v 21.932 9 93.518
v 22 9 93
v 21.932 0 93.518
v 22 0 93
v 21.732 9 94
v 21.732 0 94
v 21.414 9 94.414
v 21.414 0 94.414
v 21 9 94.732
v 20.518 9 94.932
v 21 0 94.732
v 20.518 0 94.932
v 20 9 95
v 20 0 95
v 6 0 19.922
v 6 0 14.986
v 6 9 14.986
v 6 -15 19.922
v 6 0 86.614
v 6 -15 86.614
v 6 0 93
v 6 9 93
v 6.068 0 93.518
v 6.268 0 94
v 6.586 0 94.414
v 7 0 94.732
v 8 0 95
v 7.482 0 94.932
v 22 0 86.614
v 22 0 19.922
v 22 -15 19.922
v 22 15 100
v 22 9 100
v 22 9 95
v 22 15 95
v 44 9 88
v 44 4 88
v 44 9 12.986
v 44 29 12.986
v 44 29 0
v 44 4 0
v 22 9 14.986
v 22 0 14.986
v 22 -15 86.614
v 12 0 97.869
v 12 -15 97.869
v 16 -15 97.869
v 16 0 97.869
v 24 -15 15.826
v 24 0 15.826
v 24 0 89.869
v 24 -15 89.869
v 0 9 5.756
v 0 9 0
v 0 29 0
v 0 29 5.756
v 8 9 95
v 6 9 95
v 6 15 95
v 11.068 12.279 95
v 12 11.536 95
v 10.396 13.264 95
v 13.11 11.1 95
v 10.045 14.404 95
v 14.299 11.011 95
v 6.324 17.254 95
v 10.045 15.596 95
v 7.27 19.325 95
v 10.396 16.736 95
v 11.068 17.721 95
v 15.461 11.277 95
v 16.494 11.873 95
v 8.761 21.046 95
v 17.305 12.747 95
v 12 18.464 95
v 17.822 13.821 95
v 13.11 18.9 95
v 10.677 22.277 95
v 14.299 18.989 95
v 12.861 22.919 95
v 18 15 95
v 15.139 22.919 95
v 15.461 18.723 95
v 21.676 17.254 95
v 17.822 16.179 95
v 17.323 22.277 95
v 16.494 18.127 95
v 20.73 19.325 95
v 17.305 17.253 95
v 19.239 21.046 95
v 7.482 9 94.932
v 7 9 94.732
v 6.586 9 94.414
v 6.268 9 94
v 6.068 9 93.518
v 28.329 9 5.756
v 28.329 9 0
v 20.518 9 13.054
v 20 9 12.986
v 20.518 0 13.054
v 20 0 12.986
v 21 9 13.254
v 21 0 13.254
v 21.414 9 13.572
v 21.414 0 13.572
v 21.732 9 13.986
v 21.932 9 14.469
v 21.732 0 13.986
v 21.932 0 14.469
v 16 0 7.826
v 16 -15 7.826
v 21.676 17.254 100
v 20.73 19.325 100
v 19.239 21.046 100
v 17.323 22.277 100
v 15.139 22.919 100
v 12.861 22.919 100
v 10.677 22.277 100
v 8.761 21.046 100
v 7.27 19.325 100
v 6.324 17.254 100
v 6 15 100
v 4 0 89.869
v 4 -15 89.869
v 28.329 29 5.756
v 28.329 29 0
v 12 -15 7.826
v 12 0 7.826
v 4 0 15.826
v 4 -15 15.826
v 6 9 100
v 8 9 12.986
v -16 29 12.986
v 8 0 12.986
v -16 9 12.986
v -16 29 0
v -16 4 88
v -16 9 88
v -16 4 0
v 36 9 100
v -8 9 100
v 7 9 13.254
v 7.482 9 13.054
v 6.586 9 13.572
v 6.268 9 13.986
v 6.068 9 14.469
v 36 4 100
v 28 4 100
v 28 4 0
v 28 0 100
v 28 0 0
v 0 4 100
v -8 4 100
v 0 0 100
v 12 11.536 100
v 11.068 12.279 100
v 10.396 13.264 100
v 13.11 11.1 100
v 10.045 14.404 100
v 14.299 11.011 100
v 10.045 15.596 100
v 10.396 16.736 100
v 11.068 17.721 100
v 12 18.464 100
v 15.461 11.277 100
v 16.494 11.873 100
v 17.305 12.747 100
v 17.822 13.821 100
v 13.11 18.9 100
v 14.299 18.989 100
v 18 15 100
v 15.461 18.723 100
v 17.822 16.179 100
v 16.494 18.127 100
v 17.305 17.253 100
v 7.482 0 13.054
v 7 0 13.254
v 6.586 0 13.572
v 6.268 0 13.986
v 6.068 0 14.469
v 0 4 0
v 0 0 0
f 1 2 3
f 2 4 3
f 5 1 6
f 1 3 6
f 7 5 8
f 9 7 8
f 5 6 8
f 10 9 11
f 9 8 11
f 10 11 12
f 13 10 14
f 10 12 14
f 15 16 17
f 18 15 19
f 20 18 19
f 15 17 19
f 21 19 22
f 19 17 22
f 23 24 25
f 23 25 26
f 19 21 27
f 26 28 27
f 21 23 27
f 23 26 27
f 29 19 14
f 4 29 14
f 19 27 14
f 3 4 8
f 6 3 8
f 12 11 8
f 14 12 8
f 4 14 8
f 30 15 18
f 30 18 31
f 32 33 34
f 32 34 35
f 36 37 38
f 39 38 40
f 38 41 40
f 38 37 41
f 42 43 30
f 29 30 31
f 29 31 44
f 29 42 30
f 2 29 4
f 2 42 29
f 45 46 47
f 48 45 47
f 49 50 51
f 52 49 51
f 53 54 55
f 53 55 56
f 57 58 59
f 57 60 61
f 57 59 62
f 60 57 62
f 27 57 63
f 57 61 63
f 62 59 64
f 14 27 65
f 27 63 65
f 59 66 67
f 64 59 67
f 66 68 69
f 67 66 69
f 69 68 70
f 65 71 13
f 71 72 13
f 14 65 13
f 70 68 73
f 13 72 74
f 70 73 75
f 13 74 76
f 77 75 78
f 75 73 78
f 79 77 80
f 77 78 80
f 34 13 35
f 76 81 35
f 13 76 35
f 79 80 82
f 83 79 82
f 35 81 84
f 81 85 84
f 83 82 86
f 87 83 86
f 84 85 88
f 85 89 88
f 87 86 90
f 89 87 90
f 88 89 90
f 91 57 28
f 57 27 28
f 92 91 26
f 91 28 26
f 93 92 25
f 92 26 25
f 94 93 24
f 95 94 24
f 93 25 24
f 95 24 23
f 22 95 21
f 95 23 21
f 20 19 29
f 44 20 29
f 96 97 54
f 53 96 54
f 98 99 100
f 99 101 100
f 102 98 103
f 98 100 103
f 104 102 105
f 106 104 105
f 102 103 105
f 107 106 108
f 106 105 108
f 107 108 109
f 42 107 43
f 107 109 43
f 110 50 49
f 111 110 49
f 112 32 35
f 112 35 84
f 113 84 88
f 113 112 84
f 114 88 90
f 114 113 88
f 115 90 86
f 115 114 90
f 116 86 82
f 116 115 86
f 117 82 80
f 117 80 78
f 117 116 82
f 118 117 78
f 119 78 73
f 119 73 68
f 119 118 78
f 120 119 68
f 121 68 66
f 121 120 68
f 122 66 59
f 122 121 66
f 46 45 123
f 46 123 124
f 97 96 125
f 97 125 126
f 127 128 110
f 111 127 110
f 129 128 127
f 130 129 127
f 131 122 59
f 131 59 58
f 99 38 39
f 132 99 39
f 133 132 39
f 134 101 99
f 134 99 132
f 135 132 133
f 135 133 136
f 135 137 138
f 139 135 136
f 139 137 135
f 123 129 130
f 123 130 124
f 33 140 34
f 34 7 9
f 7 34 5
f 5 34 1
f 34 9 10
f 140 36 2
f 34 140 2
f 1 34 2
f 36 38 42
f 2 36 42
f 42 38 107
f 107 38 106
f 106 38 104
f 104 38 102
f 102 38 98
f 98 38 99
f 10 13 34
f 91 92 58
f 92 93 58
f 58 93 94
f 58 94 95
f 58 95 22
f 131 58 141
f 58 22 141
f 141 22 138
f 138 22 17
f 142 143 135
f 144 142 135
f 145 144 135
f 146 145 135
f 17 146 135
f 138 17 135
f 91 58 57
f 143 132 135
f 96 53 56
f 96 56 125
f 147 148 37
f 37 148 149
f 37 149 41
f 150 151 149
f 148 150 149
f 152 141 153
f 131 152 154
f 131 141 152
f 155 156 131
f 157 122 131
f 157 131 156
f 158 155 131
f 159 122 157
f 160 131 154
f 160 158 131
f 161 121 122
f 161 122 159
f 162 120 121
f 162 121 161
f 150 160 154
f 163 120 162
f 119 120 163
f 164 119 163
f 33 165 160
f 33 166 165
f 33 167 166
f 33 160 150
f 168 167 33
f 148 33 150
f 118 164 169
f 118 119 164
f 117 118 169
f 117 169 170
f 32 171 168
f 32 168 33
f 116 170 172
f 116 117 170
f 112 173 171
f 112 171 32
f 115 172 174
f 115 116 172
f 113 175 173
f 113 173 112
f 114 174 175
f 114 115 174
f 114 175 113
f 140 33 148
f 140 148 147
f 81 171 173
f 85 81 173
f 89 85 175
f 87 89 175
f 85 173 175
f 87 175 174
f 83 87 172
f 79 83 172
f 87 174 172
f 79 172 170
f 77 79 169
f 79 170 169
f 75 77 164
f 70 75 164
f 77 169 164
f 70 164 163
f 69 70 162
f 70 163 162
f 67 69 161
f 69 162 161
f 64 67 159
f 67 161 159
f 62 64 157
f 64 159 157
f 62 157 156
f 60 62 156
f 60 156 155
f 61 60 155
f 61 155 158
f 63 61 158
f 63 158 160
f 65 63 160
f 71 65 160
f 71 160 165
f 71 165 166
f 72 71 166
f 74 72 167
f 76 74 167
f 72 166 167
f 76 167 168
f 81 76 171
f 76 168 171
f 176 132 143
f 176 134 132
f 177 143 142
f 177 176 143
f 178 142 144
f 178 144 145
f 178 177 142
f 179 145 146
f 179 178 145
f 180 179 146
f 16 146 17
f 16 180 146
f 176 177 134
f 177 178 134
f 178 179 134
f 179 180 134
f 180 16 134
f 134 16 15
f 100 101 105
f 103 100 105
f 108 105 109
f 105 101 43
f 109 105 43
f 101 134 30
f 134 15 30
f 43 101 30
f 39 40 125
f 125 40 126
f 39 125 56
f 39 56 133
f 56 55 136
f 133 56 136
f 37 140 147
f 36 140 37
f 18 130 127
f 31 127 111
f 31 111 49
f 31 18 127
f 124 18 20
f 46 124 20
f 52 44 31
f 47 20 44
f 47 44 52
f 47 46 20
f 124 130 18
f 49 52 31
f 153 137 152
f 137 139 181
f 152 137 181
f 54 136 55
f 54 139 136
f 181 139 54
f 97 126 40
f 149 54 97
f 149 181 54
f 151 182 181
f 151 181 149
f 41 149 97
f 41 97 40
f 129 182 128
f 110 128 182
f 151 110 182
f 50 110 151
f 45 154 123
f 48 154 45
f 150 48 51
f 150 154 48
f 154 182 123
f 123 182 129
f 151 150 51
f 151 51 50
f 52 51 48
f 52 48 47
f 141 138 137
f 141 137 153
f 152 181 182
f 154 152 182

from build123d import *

# Parameters (mm, degrees)
BOSS_EXTRUDE1_DEPTH = 100
SKETCH2_R           = 4
BOSS_EXTRUDE2_DEPTH = 5
CUT_EXTRUDE1_DEPTH  = 111.145358504
BOSS_EXTRUDE3_DEPTH = 20
SKETCH6_W           = 16
SKETCH6_H           = 82.013760225
CUT_EXTRUDE2_DEPTH  = 20
FILLET1_R           = 2
SKETCH7_W           = 20
SKETCH7_H           = 90.042878707
SKETCH7_W_2         = 16
SKETCH7_H_2         = 66.692206804
BOSS_EXTRUDE4_DEPTH = 15
CHAMFER1_SIZE       = 8


with BuildPart() as part:
    # Sketch1 → Boss-Extrude1 (new body)
    with BuildSketch(Plane.XY):
        Polygon((28, 4), (44, 4), (44, 9), (-16, 9), (-16, 4), (0, 4), (0, 0), (28, 0), align=None)
    extrude(amount=BOSS_EXTRUDE1_DEPTH)

    # Sketch2 → Boss-Extrude2 (add)
    with BuildSketch(Plane.XY.offset(100)):
        with BuildLine():
            Line((6, 15), (6, 0))
            Line((6, 0), (22, 0))
            Line((22, 0), (22, 15))
            ThreePointArc((22, 15), (14, 23), (6, 15))
        make_face()
        with Locations((14, 15)):
            Circle(SKETCH2_R, mode=Mode.SUBTRACT)
    extrude(amount=-BOSS_EXTRUDE2_DEPTH)

    # Sketch3 → Cut-Extrude1 (cut, through all)
    with BuildSketch(Plane(origin=(0, 9, 0), x_dir=(1, 0, 0), z_dir=(0, 1, 0))):
        Polygon((36, -100), (44, -88), (44, -100), align=None)
        Polygon((-8, -100), (-16, -100), (-16, -88), align=None)
    extrude(amount=-CUT_EXTRUDE1_DEPTH, mode=Mode.SUBTRACT)

    # Sketch5 → Boss-Extrude3 (add)
    with BuildSketch(Plane(origin=(0, 9, 0), x_dir=(1, 0, 0), z_dir=(0, 1, 0))):
        Polygon((-16, 0), (0, 0), (0, -5.756429966), (28.329099736, -5.756429966), (28.329099736, 0), (44, 0), (44, -12.986239775), (-16, -12.986239775), align=None)
    extrude(amount=BOSS_EXTRUDE3_DEPTH)

    # Sketch6 → Cut-Extrude2 (cut)
    with BuildSketch(Plane(origin=(0, 9, 0), x_dir=(1, 0, 0), z_dir=(0, 1, 0))):
        with Locations((14, -53.993119888)):
            Rectangle(SKETCH6_W, SKETCH6_H)
    extrude(amount=-CUT_EXTRUDE2_DEPTH, mode=Mode.SUBTRACT)

    # Fillet1
    fillet1_edges = [part.edges().sort_by_distance(p)[0] for p in [
        (6, 4.5, 12.986239775),
        (22, 4.5, 12.986239775),
        (22, 4.5, 95),
        (6, 4.5, 95),
    ]]
    fillet(fillet1_edges, radius=FILLET1_R)

    # Sketch7 → Boss-Extrude4 (add)
    with BuildSketch(Plane.XZ):
        with Locations((14, 52.847885125)):
            Rectangle(SKETCH7_W, SKETCH7_H)
        with Locations((14, 53.267861238)):
            Rectangle(SKETCH7_W_2, SKETCH7_H_2, mode=Mode.SUBTRACT)
    extrude(amount=BOSS_EXTRUDE4_DEPTH)

    # Chamfer1
    chamfer1_edges = [part.edges().sort_by_distance(p)[0] for p in [
        (4, -7.5, 97.869324478),
        (4, -7.5, 7.826445771),
        (24, -7.5, 7.826445771),
        (24, -7.5, 97.869324478),
    ]]
    chamfer(chamfer1_edges, length=CHAMFER1_SIZE)


solid = part.part
